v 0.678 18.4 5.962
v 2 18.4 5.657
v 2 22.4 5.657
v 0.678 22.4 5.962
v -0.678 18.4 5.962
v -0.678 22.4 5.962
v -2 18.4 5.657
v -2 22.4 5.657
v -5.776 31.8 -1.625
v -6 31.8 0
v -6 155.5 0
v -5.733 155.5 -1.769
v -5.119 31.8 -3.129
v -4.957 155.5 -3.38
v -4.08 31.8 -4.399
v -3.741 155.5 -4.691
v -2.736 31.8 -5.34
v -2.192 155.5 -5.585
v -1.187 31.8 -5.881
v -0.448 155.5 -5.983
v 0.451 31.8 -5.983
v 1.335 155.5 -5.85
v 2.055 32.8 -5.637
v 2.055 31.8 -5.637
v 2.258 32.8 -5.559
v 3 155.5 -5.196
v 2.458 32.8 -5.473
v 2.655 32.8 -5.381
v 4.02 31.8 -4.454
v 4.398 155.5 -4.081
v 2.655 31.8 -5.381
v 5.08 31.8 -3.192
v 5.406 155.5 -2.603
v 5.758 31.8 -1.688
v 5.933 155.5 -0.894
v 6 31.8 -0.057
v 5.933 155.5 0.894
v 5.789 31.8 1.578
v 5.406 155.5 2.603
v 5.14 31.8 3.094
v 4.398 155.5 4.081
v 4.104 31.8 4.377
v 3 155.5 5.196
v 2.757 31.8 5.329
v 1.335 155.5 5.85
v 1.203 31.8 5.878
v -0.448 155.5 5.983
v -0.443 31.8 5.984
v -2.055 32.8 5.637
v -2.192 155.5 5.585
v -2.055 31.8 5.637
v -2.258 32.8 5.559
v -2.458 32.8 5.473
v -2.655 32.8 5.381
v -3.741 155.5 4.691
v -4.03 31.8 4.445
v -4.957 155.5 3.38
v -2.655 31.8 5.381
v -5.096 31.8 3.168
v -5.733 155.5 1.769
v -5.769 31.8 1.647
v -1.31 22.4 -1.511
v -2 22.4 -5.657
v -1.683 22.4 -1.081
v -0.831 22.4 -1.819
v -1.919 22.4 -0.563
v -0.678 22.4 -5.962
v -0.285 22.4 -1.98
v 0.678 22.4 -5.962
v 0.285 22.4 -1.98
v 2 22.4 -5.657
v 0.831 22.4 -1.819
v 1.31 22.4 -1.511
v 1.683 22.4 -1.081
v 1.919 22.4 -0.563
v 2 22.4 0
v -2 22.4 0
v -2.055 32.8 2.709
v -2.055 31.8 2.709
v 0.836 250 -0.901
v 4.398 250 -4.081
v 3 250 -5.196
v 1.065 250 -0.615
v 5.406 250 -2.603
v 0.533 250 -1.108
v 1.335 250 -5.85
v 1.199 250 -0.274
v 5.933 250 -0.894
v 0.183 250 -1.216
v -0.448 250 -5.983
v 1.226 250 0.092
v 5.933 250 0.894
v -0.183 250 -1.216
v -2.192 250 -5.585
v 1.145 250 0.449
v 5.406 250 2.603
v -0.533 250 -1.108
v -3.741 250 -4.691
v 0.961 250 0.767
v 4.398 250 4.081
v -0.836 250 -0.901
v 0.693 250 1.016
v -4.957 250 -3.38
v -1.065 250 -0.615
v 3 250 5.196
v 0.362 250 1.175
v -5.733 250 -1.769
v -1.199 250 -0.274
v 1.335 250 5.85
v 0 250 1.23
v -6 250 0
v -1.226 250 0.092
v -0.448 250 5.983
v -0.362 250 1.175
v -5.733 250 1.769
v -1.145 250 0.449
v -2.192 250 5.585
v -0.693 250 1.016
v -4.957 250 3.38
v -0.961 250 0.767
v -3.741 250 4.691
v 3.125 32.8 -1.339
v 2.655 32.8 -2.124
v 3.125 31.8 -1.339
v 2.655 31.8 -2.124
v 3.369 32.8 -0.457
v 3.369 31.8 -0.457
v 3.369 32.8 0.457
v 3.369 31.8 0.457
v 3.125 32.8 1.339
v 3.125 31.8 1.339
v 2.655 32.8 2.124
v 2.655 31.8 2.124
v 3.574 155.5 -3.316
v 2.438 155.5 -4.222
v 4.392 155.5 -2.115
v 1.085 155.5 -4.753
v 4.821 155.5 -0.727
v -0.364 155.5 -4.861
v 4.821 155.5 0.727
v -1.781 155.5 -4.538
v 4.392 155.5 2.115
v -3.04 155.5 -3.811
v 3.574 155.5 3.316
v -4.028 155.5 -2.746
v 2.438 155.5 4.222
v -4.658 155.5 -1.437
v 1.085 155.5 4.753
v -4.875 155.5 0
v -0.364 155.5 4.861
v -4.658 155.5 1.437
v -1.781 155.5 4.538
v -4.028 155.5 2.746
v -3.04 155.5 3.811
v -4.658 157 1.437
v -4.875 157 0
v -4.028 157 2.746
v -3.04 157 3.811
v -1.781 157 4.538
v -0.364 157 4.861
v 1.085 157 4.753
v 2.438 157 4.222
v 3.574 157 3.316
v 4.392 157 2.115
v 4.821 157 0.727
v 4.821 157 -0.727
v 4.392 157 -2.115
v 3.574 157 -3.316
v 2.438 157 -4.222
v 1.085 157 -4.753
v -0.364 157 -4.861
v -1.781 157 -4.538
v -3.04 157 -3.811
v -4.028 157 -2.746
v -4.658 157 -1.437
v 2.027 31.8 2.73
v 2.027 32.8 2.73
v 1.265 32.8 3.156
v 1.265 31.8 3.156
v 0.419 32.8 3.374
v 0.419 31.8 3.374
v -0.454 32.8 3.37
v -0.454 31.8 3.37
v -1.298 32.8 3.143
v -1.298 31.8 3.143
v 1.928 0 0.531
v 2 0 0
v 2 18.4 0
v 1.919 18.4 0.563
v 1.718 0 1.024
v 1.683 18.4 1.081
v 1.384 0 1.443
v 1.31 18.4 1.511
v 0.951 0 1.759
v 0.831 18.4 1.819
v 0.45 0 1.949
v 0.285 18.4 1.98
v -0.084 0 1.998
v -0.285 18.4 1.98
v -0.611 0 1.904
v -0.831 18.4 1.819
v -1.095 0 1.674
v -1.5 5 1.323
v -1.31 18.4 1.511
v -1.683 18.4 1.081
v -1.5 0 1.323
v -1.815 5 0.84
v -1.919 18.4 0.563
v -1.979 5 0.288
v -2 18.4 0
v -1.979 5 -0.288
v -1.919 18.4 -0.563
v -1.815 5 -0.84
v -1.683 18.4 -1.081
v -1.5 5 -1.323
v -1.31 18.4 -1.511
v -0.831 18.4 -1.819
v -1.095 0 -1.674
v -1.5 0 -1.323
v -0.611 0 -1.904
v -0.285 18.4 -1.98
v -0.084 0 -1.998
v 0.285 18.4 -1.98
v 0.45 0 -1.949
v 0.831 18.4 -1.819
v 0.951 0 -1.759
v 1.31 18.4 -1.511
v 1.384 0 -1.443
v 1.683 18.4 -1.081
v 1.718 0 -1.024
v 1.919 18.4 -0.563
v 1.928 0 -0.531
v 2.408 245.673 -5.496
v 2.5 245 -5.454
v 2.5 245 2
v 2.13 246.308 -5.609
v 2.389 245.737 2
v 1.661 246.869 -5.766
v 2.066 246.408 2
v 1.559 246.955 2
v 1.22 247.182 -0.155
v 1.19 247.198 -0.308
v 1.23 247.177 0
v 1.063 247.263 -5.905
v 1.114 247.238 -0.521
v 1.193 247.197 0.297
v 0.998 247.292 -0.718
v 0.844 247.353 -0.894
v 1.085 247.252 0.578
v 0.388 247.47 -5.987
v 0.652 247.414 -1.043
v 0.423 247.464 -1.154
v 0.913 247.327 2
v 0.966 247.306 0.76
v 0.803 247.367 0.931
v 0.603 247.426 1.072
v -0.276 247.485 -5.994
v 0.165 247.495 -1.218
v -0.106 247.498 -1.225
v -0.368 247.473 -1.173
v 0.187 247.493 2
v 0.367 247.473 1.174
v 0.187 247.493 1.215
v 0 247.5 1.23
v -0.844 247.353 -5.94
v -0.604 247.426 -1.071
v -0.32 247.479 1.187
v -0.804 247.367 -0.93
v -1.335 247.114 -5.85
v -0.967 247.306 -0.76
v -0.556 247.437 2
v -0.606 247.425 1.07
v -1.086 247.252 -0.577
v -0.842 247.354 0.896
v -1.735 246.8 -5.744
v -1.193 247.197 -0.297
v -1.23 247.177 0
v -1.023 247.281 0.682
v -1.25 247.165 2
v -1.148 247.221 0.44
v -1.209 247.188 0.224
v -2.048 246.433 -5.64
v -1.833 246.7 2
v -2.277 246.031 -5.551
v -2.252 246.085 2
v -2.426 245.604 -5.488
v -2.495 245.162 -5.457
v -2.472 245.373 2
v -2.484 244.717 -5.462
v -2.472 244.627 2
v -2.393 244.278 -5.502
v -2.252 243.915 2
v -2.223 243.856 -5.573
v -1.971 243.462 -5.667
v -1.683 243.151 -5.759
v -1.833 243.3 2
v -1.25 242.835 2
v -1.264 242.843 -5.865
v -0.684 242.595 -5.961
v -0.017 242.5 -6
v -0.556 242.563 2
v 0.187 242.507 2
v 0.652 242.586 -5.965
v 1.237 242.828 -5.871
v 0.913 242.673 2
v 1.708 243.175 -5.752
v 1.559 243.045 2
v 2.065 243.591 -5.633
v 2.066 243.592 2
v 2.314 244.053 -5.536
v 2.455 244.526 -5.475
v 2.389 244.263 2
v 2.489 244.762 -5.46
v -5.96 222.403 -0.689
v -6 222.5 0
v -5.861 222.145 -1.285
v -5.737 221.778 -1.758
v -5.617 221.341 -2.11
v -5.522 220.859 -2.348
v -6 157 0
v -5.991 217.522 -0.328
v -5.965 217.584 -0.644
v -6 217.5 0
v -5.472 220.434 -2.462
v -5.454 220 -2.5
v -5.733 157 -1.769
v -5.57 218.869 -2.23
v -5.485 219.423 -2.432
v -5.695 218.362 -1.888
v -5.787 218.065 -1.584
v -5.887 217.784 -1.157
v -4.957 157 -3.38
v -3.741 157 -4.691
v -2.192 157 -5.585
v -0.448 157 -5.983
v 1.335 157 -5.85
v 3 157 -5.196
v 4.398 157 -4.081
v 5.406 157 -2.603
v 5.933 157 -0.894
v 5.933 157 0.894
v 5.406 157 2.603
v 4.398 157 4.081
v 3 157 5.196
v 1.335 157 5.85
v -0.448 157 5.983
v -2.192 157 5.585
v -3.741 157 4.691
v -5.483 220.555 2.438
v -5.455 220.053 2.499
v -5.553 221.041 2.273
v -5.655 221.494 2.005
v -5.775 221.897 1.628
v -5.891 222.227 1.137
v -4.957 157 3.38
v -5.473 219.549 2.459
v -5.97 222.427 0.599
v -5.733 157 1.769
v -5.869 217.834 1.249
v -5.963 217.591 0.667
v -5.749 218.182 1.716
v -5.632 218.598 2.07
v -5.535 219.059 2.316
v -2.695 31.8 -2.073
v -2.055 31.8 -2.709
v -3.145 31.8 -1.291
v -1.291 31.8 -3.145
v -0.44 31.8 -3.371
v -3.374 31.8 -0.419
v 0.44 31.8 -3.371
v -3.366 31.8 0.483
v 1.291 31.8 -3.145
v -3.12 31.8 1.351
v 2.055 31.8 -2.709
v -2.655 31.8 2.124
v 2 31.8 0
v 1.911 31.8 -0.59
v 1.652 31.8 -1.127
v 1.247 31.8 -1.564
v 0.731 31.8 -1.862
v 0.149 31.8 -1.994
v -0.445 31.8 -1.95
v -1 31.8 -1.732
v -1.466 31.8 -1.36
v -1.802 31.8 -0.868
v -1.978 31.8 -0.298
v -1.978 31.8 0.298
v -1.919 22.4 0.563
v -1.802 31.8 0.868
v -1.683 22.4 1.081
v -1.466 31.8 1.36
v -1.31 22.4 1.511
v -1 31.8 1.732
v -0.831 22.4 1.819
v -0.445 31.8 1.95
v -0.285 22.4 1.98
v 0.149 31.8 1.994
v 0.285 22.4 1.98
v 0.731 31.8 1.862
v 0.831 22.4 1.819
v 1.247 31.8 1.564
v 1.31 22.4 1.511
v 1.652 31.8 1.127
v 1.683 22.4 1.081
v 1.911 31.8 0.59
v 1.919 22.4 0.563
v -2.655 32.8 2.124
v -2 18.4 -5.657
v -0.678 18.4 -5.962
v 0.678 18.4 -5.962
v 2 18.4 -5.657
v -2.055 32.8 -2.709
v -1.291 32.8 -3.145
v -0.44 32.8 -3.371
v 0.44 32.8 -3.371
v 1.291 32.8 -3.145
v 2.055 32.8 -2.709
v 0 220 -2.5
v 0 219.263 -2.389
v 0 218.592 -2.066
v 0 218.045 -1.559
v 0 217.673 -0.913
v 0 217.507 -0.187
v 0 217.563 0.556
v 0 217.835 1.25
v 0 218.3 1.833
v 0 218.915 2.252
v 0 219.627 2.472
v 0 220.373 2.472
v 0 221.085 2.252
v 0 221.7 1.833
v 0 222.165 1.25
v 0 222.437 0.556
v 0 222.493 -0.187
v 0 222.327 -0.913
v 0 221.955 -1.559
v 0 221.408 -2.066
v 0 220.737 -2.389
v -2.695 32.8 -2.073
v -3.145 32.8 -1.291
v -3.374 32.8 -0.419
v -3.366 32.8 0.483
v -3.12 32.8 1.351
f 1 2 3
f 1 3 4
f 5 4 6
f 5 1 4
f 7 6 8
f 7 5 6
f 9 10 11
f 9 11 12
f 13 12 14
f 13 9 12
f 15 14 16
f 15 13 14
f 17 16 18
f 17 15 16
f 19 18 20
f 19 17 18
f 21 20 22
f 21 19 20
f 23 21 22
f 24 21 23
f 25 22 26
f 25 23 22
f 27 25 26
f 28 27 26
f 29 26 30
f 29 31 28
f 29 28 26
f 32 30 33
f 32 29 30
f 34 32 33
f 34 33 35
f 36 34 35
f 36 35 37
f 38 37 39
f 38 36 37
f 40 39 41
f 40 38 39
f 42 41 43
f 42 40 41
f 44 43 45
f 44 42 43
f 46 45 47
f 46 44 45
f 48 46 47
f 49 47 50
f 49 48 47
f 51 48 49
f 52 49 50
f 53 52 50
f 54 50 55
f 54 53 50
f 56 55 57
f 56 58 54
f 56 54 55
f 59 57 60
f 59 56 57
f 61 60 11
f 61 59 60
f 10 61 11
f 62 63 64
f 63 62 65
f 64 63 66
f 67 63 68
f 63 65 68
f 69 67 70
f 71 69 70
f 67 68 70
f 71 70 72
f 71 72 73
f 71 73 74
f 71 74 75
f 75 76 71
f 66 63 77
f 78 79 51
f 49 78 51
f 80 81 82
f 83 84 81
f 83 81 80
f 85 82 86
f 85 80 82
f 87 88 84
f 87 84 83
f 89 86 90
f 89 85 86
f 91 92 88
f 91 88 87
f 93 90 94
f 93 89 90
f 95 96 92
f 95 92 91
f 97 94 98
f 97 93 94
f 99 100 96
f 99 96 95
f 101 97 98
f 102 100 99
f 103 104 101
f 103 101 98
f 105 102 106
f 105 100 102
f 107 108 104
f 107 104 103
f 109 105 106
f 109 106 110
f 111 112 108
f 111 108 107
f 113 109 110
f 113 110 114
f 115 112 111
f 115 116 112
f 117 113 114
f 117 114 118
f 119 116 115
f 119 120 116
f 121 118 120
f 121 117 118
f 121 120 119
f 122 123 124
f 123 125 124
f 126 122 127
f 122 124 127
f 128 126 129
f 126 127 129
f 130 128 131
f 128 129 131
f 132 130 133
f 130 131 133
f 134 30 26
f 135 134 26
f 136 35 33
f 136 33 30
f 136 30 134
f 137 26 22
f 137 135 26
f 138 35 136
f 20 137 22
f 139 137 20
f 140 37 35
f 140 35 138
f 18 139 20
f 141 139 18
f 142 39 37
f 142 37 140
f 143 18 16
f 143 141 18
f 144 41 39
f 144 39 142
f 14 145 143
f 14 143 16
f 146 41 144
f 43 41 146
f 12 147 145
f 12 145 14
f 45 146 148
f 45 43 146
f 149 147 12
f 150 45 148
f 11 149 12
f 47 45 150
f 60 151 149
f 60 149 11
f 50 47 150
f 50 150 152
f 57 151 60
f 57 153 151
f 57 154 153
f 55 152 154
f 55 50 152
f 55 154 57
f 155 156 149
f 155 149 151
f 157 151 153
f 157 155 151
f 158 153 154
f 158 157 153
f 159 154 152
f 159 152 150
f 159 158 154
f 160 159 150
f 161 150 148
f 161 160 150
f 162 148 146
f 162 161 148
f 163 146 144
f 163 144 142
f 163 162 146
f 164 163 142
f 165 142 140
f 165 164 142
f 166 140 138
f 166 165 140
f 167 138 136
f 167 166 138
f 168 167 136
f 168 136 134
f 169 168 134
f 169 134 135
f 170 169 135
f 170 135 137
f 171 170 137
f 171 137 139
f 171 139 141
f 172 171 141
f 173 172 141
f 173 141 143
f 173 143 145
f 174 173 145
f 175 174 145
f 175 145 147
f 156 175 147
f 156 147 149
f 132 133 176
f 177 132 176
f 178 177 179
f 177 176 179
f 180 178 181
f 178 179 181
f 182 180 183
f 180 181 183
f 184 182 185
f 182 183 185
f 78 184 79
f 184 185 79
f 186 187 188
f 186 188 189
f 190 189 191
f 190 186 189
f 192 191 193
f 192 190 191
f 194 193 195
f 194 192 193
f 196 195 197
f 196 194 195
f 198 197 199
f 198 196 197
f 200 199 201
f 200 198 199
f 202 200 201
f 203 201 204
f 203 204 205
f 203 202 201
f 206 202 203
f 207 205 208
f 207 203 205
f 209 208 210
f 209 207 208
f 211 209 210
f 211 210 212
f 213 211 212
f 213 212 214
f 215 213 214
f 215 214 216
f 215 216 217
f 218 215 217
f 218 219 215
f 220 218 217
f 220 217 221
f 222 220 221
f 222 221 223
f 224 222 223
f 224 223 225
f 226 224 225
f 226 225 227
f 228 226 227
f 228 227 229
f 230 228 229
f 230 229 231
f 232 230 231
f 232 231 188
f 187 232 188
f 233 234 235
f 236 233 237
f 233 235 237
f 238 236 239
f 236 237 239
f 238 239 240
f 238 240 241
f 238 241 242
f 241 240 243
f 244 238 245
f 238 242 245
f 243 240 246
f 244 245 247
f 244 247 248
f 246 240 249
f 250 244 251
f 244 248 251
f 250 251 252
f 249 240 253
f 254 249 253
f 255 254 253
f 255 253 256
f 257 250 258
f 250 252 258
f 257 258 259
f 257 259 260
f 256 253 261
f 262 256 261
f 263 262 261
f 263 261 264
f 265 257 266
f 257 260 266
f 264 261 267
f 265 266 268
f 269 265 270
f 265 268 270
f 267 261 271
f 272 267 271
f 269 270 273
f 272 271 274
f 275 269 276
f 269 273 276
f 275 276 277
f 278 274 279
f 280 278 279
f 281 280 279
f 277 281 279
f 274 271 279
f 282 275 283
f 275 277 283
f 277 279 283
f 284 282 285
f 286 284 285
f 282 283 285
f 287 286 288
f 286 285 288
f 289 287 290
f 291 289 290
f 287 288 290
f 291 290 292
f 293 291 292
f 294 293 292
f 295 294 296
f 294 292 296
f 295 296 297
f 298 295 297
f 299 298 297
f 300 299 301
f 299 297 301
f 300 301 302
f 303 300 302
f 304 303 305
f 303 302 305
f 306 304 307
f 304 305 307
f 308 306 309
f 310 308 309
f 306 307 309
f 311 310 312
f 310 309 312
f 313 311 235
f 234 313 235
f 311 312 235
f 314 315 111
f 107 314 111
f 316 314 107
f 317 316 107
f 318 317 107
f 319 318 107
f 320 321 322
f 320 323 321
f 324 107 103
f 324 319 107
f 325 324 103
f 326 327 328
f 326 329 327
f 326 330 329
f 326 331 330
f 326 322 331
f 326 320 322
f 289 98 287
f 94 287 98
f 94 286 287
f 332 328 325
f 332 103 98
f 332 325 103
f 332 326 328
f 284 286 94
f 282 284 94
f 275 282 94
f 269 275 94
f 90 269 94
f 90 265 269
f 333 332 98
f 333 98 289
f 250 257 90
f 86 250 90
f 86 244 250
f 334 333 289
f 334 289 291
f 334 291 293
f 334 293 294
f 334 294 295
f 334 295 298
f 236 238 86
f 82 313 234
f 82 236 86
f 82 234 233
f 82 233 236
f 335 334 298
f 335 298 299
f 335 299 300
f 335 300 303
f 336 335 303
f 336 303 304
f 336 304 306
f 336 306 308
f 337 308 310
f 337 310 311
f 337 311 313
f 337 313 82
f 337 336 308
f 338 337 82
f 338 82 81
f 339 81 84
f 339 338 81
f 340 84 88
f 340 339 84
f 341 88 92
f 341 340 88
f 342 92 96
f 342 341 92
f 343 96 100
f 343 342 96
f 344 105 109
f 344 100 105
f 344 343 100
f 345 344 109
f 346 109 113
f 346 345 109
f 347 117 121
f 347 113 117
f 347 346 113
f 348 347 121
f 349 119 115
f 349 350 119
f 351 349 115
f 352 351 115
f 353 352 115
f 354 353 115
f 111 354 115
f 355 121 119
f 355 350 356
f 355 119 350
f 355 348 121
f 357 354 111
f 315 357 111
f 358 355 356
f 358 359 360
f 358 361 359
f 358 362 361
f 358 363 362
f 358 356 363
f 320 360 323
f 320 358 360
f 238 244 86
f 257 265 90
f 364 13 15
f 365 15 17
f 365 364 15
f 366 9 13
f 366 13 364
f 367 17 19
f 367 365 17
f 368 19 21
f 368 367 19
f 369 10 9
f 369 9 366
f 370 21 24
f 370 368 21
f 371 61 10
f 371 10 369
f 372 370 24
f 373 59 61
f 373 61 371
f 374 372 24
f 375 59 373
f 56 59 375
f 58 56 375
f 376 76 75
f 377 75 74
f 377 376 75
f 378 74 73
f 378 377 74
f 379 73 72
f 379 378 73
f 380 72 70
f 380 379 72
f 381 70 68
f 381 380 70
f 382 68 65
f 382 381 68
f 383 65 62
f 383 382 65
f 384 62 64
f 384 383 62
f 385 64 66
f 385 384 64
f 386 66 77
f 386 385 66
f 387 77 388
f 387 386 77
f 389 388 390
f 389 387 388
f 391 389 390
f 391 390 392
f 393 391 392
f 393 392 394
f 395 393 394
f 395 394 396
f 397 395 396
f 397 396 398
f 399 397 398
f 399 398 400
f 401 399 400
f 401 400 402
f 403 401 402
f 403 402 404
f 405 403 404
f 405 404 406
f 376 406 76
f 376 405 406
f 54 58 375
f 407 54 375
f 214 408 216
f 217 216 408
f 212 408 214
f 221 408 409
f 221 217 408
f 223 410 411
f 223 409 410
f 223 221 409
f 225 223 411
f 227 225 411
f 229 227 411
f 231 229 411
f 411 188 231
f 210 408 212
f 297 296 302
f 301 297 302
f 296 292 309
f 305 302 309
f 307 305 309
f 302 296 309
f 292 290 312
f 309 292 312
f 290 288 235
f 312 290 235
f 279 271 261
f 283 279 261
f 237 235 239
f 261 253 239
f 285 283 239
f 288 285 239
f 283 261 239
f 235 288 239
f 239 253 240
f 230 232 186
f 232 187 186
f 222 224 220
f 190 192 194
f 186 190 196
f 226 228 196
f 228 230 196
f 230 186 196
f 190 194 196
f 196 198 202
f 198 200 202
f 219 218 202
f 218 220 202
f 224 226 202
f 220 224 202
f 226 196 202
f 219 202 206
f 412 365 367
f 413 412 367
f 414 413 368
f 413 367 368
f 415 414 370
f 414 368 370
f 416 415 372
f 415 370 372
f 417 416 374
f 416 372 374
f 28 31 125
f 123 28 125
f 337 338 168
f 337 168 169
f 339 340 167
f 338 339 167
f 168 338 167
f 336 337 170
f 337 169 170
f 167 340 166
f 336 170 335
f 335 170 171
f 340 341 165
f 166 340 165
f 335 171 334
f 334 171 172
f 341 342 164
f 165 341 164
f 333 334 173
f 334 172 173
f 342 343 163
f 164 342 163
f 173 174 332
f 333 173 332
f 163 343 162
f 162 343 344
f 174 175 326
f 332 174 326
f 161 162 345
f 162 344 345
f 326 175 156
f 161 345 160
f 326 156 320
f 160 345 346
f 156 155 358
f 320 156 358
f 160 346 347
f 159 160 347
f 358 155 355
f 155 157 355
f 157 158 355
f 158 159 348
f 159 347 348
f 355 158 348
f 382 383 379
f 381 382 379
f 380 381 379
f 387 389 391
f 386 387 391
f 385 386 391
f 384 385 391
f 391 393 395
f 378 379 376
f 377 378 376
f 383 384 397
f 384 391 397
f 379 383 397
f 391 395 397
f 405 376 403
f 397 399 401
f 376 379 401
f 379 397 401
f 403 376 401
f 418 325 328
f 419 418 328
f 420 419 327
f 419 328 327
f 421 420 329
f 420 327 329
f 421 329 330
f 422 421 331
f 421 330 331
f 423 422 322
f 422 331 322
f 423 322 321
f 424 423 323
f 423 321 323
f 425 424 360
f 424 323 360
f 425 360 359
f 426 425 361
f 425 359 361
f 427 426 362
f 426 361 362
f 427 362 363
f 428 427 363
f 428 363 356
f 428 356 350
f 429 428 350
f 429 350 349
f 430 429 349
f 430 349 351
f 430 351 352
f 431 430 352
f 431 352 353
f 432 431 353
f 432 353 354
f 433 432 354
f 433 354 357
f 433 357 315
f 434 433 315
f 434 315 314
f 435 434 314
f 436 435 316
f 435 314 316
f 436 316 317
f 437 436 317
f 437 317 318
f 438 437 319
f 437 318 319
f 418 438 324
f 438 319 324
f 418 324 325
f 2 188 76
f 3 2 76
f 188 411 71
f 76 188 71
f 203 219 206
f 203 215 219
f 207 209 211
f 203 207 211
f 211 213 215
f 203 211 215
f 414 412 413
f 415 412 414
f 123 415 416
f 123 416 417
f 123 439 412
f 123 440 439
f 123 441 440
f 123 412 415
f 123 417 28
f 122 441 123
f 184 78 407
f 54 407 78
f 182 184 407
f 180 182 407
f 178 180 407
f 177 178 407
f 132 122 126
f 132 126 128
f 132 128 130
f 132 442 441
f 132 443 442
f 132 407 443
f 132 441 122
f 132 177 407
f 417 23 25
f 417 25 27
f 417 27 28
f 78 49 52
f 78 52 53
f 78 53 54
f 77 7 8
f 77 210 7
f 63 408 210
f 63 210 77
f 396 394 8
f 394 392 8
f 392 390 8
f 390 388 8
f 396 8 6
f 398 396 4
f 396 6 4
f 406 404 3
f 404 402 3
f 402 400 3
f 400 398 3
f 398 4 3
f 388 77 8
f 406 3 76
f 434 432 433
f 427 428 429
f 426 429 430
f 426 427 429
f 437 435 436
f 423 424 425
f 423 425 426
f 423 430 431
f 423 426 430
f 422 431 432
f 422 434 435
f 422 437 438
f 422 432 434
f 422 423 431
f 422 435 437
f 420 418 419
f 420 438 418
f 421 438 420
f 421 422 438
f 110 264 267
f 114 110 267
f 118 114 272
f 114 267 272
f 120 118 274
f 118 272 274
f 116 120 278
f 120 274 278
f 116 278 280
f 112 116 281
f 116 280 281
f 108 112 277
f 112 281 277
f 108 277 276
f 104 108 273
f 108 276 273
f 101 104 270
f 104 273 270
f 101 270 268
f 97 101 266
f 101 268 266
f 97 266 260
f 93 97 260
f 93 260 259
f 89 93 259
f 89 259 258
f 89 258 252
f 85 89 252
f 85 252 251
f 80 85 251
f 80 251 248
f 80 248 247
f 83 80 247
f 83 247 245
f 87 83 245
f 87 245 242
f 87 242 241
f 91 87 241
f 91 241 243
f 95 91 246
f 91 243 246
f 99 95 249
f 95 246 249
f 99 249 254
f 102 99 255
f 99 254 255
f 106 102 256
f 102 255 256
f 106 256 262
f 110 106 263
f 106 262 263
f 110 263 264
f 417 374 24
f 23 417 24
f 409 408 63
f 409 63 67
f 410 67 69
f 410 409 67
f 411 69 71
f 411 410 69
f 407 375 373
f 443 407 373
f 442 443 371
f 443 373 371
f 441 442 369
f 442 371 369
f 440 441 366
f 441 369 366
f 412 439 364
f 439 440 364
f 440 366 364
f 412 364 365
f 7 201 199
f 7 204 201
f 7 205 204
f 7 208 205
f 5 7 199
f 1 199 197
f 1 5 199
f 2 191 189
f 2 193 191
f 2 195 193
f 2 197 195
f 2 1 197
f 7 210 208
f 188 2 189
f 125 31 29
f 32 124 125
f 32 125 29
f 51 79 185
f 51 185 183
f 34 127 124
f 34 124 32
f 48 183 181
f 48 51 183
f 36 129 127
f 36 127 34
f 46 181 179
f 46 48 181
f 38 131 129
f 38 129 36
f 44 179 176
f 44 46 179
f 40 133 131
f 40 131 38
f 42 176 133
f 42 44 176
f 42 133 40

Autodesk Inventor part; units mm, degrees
ref_plane "YZ Plane" through (0, 0, 0) normal (1, 0, 0) x (0, 1, 0)
ref_plane "XZ Plane" through (0, 0, 0) normal (0, 1, 0) x (-1, 0, 0)
sketch "Sketch1" plane through (0, 0, 0) normal (0, 1, 0) x (-1, 0, 0)
  circle A0 centre (0, 0) radius 6
  dimension "d0" = 12
extrude "Extrusion1" add sketch "Sketch1" along normal blind 250
sketch "Sketch2" plane through (0, 0, 0) normal (0, 0, 1) x (1, 0, 0)
  line L0 (-6, 0) -> (-6, 250) projected
  line L1 (-6, 155.5) -> (-4.875, 155.5)
  line L2 (-4.875, 155.5) -> (-4.875, 157)
  line L3 (-4.875, 157) -> (-6, 157)
  line L4 (-6, 157) -> (-6, 155.5)
  line L5 (0, 0) -> (0, 268.3776) construction
  line L6 (-6, 0) -> (6, 0) projected
  line L7 (6, 250) -> (-6, 250) projected
  dimension "d3" = 1.125
  dimension "d4" = 1.5
  dimension "d21" = 93
revolve "Revolution1" cut sketch "Sketch2" angle 360 about axis through (0, 0, 0) along (0, 1, 0)
sketch "Sketch3" plane through (0, 0, 0) normal (0, 0, 1) x (1, 0, 0)
  circle A0 centre (0, 245) radius 2.5
  line L0 (6, 250) -> (-6, 250) projected
  point P0 (0, 0)
  dimension "d7" = 5
  dimension "d9" = 5
extrude "Extrusion2" cut sketch "Sketch3" along normal blind 2 and the other way blind 10
sketch "Sketch4" plane through (0, 250, 0) normal (0, 1, 0) x (1, 0, 0)
  point P0 (0, 0)
  point P1 (0, 0)
hole "Hole1" at (0, 250, 0) direction (0, -1, 0) diameter 2.459 depth 6 tip angle 118 thread size "M3x0.5" class "6H" standard "ANSI Metric M Profile"
sketch "Sketch5" plane through (0, 0, 0) normal (1, 0, 0) x (0, 1, 0)
  line L0 (250, -6) -> (250, 6) projected
  point P0 (0, 0)
  point P1 (220, 0)
  dimension "d22" = 30
hole "Hole2" at (0, 220, 0) direction (-1, 0, 0) diameter 5 end through all
sketch "Sketch6" plane through (0, 0, 0) normal (0, -1, 0) x (1, 0, 0)
  circle A0 centre (0, 0) radius 2
  circle A1 centre (0, 0) radius 6
  dimension "d30" = 4
  dimension "d31" = 12
extrude "Extrusion3" cut sketch "Sketch6" against normal blind 18.4
ref_plane "Work Plane1" through (0, 31.8, 0) normal (0, -1, 0) x (1, 0, 0)
sketch "Sketch7" plane through (0, 31.8, 0) normal (0, -1, 0) x (1, 0, 0)
  circle A0 centre (0, 0) radius 6
  circle A1 centre (0, 0) radius 2
  dimension "d35" = 12
  dimension "d36" = 4
extrude "Extrusion4" cut sketch "Sketch7" along normal blind 9.4
sketch "Sketch9" plane through (0, 0, 0) normal (0, 0, 1) x (1, 0, 0)
  line L0 (2, 31.8) -> (2, 22.4) projected
  line L1 (6, 18.4) -> (-6, 18.4) projected
  line L2 (2, 22.4) -> (6, 22.4)
  line L3 (6, 22.4) -> (6, 18.4)
  line L4 (6, 18.4) -> (2, 18.4)
  line L5 (2, 18.4) -> (2, 22.4)
  line L6 (-2, 31.8) -> (-2, 22.4) projected
  line L7 (-6, 18.4) -> (-2, 18.4)
  line L8 (-2, 18.4) -> (-2, 22.4)
  line L9 (-2, 22.4) -> (-6, 22.4)
  line L10 (-6, 22.4) -> (-6, 18.4)
  point P0 (0, 0)
  dimension "d39" = 4
extrude "Extrusion5" cut sketch "Sketch9" along normal through all both and the other way through all
sketch "Sketch10" plane through (0, 31.8, 0) normal (0, -1, 0) x (1, 0, 0)
  arc A0 (2.0552, 1.1503) -> (2.0552, -1.1503) centre (0, 0) ccw construction
  line L0 (0, 2.5) -> (0, -2.5) projected
  line L1 (2.0552, -6.3985) -> (2.6552, -6.3985)
  line L2 (2.6552, -6.3985) -> (2.6552, -2.1237)
  arc A1 (-2.0552, -2.7086) -> (2.0552, -2.7086) centre (0, 0) ccw
  arc A2 (2.6552, -2.1237) -> (2.6552, 2.1237) centre (0, 0) ccw
  line L3 (2.0552, -2.7086) -> (2.0552, -6.3985)
  line L4 (-2.0552, 7.8347) -> (-2.6552, 7.8347)
  line L5 (-2.6552, 7.8347) -> (-2.6552, 2.1237)
  line L6 (-2.0552, 2.7086) -> (-2.0552, 7.8347)
  arc A3 (2.6552, -2.1237) -> (-2.0552, 2.7086) centre (0, 0) ccw
  arc A4 (-2.6552, 2.1237) -> (2.0552, -2.7086) centre (0, 0) ccw
  arc A5 (2.0552, 2.7086) -> (-2.0552, 2.7086) centre (0, 0) ccw
  arc A6 (-2.6552, 2.1237) -> (-2.6552, -2.1237) centre (0, 0) ccw
  dimension "d59" = 0
  dimension "d60" = 0.6
  dimension "d62" = 0.6
extrude "Extrusion6" cut sketch "Sketch10" against normal blind 1
sketch "Sketch11" plane through (-2, 18.4, -5.6569) normal (-1, 0, 0) x (0, 0, 1)
  line L0 (3.6569, -18.4) -> (3.6569, 0) projected
  line L1 (7.6569, -18.4) -> (7.6569, 0) projected
  line L2 (3.6569, -18.4) -> (7.6569, -18.4)
  line L3 (7.6569, -18.4) -> (7.6569, -13.4)
  line L4 (7.6569, -13.4) -> (3.6569, -13.4)
  line L5 (3.6569, -13.4) -> (3.6569, -18.4)
  point P0 (5.6569, -18.4)
  dimension "d63" = 5
extrude "Extrusion7" cut sketch "Sketch11" against normal blind 0.5
properties part number "Lever"
